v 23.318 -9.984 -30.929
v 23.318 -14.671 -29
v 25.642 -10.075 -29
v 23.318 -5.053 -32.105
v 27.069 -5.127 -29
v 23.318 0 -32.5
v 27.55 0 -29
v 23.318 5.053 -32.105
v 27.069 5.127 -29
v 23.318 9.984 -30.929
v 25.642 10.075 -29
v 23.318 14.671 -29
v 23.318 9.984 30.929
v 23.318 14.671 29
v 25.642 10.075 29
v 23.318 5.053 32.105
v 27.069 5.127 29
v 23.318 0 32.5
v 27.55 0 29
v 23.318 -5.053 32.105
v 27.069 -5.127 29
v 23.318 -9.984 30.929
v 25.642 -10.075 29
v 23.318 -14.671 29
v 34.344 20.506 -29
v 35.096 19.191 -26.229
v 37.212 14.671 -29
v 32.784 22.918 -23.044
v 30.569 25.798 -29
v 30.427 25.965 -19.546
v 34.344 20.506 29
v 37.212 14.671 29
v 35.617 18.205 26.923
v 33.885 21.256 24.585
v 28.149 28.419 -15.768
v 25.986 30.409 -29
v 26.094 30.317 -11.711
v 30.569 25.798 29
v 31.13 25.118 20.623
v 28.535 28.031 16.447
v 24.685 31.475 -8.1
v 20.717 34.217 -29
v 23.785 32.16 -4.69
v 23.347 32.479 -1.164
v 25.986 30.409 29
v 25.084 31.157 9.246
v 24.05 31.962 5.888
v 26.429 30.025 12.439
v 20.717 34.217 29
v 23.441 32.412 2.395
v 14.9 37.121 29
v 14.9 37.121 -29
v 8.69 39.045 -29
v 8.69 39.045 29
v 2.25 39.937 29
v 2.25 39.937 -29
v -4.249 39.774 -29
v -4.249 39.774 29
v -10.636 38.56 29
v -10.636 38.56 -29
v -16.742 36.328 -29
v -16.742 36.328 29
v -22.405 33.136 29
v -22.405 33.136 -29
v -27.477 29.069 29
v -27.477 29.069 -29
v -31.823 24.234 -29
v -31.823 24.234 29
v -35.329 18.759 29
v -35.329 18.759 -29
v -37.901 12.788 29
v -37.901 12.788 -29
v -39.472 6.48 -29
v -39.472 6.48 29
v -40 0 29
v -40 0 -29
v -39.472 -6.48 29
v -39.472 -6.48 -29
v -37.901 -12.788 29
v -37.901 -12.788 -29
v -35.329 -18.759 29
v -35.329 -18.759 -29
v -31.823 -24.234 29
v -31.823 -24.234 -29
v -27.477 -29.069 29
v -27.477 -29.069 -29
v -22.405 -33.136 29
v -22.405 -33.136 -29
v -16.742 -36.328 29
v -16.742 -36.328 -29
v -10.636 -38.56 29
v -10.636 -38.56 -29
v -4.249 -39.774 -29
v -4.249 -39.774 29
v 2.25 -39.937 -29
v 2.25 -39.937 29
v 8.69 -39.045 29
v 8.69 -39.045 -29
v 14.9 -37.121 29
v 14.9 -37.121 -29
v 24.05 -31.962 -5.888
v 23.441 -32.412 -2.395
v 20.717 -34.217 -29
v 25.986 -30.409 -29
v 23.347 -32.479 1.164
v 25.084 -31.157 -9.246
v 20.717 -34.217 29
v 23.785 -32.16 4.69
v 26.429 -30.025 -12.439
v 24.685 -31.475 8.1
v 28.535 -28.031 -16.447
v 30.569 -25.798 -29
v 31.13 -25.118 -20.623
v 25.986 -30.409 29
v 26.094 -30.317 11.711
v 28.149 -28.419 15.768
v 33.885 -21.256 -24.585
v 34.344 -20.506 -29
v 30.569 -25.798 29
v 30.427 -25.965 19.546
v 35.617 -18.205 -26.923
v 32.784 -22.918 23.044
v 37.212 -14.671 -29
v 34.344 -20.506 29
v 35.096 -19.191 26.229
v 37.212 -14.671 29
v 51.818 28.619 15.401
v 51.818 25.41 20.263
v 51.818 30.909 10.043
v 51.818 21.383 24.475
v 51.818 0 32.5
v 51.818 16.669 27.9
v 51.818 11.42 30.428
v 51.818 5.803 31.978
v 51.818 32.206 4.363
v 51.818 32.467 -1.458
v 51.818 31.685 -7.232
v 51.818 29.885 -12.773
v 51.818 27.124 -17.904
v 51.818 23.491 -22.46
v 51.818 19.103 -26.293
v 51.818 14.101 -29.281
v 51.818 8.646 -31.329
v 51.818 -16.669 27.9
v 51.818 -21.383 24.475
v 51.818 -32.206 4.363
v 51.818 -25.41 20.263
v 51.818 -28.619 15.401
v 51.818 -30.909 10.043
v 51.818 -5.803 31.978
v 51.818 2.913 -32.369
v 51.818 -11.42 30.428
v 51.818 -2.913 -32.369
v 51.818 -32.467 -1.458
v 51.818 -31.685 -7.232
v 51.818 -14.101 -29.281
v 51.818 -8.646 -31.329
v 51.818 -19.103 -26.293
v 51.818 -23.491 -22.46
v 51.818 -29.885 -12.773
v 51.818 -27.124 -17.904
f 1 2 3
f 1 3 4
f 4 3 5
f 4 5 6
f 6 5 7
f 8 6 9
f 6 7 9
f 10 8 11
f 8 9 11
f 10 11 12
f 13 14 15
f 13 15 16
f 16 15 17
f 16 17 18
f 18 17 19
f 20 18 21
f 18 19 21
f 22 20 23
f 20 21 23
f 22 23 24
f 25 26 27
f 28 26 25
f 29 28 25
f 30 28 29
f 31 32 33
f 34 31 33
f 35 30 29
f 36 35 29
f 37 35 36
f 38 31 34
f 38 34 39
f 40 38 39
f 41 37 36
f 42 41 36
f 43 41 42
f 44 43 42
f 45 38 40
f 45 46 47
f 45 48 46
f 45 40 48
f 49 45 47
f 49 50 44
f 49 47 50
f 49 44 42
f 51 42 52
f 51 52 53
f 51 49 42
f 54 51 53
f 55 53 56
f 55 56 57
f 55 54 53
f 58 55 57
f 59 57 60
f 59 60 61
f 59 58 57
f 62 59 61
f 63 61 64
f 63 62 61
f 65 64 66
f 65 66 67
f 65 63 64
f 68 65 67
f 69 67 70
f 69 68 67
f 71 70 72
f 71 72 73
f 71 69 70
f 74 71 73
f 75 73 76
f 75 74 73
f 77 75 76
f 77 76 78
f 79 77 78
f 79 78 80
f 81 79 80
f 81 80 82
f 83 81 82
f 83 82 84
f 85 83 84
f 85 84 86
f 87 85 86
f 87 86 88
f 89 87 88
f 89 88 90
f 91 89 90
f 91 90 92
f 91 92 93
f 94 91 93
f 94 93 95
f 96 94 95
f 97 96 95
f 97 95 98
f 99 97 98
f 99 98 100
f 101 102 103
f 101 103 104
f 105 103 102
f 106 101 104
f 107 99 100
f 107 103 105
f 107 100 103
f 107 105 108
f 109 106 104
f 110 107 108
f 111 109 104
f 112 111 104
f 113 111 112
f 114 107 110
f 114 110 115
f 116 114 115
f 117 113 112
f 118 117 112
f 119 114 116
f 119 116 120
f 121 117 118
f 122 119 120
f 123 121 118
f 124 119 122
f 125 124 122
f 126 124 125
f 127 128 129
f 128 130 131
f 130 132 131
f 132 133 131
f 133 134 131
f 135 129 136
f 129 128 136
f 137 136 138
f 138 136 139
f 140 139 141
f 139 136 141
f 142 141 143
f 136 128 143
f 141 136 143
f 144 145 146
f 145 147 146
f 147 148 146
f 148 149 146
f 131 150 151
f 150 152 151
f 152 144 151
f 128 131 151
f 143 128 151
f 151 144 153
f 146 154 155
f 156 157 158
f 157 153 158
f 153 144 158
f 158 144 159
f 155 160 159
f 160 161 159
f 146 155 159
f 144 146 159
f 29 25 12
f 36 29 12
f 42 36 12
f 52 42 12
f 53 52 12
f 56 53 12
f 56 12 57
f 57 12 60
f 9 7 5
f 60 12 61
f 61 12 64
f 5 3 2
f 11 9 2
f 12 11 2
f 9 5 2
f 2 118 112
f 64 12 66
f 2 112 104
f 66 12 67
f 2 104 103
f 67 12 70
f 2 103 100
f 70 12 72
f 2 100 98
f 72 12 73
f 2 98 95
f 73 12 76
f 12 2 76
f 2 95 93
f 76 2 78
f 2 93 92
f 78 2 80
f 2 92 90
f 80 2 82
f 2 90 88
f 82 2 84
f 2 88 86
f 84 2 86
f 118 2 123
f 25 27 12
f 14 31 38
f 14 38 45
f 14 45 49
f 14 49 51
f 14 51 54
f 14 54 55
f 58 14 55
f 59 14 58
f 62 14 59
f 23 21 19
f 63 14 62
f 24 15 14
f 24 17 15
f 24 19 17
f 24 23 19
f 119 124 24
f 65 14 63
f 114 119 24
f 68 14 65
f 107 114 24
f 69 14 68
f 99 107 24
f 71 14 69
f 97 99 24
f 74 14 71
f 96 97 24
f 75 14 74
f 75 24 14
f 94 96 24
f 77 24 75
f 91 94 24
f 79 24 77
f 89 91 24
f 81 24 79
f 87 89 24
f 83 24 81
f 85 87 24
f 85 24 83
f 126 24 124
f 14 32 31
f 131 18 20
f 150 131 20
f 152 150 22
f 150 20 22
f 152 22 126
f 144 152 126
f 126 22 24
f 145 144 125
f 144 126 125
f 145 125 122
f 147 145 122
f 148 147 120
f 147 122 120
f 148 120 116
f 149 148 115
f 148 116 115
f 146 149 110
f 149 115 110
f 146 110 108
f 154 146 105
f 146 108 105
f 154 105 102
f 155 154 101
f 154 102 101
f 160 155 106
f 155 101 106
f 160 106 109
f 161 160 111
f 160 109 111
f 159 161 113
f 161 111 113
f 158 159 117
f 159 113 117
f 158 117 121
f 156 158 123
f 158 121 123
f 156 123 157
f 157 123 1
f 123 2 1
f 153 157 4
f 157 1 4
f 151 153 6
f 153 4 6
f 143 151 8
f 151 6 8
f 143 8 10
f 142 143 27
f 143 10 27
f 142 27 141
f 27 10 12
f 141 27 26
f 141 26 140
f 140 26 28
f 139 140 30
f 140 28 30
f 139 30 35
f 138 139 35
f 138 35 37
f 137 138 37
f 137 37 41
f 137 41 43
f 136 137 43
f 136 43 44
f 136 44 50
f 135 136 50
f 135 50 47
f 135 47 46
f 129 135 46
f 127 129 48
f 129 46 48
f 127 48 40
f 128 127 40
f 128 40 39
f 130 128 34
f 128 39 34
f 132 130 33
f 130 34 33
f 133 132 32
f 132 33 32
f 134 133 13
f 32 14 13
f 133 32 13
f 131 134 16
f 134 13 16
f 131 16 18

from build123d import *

# Parameters (mm, degrees)
SCHIZZO2_R = 40
BASE_DEPTH = 29


with BuildPart() as part:
    # Schizzo2 → Base (new, symmetric)
    with BuildSketch(Plane.XY):
        with Locations(Location((0, 0, 0), (0, 0, 180))):
            Circle(SCHIZZO2_R)
    extrude(amount=BASE_DEPTH, both=True)

    # Schizzo3 → Rivoluzione1 (revolve)
    with BuildSketch(Plane.XY, mode=Mode.PRIVATE) as rivoluzione1_sk:
        with BuildLine():
            Line((40, 0), (51.818447633, 0))
            Line((51.818447633, 0), (51.818447633, -32.5))
            Line((51.818447633, -32.5), (23.318447633, -32.5))
            ThreePointArc((23.318447633, -32.5), (35.586078074, -18.265569998), (40, 0))
        make_face()
    revolve(rivoluzione1_sk.sketch.rotate(Axis((-78.446809676, 0, 0), (1, 0, 0)), 270), axis=Axis((-78.446809676, 0, 0), (1, 0, 0)))


solid = part.part
